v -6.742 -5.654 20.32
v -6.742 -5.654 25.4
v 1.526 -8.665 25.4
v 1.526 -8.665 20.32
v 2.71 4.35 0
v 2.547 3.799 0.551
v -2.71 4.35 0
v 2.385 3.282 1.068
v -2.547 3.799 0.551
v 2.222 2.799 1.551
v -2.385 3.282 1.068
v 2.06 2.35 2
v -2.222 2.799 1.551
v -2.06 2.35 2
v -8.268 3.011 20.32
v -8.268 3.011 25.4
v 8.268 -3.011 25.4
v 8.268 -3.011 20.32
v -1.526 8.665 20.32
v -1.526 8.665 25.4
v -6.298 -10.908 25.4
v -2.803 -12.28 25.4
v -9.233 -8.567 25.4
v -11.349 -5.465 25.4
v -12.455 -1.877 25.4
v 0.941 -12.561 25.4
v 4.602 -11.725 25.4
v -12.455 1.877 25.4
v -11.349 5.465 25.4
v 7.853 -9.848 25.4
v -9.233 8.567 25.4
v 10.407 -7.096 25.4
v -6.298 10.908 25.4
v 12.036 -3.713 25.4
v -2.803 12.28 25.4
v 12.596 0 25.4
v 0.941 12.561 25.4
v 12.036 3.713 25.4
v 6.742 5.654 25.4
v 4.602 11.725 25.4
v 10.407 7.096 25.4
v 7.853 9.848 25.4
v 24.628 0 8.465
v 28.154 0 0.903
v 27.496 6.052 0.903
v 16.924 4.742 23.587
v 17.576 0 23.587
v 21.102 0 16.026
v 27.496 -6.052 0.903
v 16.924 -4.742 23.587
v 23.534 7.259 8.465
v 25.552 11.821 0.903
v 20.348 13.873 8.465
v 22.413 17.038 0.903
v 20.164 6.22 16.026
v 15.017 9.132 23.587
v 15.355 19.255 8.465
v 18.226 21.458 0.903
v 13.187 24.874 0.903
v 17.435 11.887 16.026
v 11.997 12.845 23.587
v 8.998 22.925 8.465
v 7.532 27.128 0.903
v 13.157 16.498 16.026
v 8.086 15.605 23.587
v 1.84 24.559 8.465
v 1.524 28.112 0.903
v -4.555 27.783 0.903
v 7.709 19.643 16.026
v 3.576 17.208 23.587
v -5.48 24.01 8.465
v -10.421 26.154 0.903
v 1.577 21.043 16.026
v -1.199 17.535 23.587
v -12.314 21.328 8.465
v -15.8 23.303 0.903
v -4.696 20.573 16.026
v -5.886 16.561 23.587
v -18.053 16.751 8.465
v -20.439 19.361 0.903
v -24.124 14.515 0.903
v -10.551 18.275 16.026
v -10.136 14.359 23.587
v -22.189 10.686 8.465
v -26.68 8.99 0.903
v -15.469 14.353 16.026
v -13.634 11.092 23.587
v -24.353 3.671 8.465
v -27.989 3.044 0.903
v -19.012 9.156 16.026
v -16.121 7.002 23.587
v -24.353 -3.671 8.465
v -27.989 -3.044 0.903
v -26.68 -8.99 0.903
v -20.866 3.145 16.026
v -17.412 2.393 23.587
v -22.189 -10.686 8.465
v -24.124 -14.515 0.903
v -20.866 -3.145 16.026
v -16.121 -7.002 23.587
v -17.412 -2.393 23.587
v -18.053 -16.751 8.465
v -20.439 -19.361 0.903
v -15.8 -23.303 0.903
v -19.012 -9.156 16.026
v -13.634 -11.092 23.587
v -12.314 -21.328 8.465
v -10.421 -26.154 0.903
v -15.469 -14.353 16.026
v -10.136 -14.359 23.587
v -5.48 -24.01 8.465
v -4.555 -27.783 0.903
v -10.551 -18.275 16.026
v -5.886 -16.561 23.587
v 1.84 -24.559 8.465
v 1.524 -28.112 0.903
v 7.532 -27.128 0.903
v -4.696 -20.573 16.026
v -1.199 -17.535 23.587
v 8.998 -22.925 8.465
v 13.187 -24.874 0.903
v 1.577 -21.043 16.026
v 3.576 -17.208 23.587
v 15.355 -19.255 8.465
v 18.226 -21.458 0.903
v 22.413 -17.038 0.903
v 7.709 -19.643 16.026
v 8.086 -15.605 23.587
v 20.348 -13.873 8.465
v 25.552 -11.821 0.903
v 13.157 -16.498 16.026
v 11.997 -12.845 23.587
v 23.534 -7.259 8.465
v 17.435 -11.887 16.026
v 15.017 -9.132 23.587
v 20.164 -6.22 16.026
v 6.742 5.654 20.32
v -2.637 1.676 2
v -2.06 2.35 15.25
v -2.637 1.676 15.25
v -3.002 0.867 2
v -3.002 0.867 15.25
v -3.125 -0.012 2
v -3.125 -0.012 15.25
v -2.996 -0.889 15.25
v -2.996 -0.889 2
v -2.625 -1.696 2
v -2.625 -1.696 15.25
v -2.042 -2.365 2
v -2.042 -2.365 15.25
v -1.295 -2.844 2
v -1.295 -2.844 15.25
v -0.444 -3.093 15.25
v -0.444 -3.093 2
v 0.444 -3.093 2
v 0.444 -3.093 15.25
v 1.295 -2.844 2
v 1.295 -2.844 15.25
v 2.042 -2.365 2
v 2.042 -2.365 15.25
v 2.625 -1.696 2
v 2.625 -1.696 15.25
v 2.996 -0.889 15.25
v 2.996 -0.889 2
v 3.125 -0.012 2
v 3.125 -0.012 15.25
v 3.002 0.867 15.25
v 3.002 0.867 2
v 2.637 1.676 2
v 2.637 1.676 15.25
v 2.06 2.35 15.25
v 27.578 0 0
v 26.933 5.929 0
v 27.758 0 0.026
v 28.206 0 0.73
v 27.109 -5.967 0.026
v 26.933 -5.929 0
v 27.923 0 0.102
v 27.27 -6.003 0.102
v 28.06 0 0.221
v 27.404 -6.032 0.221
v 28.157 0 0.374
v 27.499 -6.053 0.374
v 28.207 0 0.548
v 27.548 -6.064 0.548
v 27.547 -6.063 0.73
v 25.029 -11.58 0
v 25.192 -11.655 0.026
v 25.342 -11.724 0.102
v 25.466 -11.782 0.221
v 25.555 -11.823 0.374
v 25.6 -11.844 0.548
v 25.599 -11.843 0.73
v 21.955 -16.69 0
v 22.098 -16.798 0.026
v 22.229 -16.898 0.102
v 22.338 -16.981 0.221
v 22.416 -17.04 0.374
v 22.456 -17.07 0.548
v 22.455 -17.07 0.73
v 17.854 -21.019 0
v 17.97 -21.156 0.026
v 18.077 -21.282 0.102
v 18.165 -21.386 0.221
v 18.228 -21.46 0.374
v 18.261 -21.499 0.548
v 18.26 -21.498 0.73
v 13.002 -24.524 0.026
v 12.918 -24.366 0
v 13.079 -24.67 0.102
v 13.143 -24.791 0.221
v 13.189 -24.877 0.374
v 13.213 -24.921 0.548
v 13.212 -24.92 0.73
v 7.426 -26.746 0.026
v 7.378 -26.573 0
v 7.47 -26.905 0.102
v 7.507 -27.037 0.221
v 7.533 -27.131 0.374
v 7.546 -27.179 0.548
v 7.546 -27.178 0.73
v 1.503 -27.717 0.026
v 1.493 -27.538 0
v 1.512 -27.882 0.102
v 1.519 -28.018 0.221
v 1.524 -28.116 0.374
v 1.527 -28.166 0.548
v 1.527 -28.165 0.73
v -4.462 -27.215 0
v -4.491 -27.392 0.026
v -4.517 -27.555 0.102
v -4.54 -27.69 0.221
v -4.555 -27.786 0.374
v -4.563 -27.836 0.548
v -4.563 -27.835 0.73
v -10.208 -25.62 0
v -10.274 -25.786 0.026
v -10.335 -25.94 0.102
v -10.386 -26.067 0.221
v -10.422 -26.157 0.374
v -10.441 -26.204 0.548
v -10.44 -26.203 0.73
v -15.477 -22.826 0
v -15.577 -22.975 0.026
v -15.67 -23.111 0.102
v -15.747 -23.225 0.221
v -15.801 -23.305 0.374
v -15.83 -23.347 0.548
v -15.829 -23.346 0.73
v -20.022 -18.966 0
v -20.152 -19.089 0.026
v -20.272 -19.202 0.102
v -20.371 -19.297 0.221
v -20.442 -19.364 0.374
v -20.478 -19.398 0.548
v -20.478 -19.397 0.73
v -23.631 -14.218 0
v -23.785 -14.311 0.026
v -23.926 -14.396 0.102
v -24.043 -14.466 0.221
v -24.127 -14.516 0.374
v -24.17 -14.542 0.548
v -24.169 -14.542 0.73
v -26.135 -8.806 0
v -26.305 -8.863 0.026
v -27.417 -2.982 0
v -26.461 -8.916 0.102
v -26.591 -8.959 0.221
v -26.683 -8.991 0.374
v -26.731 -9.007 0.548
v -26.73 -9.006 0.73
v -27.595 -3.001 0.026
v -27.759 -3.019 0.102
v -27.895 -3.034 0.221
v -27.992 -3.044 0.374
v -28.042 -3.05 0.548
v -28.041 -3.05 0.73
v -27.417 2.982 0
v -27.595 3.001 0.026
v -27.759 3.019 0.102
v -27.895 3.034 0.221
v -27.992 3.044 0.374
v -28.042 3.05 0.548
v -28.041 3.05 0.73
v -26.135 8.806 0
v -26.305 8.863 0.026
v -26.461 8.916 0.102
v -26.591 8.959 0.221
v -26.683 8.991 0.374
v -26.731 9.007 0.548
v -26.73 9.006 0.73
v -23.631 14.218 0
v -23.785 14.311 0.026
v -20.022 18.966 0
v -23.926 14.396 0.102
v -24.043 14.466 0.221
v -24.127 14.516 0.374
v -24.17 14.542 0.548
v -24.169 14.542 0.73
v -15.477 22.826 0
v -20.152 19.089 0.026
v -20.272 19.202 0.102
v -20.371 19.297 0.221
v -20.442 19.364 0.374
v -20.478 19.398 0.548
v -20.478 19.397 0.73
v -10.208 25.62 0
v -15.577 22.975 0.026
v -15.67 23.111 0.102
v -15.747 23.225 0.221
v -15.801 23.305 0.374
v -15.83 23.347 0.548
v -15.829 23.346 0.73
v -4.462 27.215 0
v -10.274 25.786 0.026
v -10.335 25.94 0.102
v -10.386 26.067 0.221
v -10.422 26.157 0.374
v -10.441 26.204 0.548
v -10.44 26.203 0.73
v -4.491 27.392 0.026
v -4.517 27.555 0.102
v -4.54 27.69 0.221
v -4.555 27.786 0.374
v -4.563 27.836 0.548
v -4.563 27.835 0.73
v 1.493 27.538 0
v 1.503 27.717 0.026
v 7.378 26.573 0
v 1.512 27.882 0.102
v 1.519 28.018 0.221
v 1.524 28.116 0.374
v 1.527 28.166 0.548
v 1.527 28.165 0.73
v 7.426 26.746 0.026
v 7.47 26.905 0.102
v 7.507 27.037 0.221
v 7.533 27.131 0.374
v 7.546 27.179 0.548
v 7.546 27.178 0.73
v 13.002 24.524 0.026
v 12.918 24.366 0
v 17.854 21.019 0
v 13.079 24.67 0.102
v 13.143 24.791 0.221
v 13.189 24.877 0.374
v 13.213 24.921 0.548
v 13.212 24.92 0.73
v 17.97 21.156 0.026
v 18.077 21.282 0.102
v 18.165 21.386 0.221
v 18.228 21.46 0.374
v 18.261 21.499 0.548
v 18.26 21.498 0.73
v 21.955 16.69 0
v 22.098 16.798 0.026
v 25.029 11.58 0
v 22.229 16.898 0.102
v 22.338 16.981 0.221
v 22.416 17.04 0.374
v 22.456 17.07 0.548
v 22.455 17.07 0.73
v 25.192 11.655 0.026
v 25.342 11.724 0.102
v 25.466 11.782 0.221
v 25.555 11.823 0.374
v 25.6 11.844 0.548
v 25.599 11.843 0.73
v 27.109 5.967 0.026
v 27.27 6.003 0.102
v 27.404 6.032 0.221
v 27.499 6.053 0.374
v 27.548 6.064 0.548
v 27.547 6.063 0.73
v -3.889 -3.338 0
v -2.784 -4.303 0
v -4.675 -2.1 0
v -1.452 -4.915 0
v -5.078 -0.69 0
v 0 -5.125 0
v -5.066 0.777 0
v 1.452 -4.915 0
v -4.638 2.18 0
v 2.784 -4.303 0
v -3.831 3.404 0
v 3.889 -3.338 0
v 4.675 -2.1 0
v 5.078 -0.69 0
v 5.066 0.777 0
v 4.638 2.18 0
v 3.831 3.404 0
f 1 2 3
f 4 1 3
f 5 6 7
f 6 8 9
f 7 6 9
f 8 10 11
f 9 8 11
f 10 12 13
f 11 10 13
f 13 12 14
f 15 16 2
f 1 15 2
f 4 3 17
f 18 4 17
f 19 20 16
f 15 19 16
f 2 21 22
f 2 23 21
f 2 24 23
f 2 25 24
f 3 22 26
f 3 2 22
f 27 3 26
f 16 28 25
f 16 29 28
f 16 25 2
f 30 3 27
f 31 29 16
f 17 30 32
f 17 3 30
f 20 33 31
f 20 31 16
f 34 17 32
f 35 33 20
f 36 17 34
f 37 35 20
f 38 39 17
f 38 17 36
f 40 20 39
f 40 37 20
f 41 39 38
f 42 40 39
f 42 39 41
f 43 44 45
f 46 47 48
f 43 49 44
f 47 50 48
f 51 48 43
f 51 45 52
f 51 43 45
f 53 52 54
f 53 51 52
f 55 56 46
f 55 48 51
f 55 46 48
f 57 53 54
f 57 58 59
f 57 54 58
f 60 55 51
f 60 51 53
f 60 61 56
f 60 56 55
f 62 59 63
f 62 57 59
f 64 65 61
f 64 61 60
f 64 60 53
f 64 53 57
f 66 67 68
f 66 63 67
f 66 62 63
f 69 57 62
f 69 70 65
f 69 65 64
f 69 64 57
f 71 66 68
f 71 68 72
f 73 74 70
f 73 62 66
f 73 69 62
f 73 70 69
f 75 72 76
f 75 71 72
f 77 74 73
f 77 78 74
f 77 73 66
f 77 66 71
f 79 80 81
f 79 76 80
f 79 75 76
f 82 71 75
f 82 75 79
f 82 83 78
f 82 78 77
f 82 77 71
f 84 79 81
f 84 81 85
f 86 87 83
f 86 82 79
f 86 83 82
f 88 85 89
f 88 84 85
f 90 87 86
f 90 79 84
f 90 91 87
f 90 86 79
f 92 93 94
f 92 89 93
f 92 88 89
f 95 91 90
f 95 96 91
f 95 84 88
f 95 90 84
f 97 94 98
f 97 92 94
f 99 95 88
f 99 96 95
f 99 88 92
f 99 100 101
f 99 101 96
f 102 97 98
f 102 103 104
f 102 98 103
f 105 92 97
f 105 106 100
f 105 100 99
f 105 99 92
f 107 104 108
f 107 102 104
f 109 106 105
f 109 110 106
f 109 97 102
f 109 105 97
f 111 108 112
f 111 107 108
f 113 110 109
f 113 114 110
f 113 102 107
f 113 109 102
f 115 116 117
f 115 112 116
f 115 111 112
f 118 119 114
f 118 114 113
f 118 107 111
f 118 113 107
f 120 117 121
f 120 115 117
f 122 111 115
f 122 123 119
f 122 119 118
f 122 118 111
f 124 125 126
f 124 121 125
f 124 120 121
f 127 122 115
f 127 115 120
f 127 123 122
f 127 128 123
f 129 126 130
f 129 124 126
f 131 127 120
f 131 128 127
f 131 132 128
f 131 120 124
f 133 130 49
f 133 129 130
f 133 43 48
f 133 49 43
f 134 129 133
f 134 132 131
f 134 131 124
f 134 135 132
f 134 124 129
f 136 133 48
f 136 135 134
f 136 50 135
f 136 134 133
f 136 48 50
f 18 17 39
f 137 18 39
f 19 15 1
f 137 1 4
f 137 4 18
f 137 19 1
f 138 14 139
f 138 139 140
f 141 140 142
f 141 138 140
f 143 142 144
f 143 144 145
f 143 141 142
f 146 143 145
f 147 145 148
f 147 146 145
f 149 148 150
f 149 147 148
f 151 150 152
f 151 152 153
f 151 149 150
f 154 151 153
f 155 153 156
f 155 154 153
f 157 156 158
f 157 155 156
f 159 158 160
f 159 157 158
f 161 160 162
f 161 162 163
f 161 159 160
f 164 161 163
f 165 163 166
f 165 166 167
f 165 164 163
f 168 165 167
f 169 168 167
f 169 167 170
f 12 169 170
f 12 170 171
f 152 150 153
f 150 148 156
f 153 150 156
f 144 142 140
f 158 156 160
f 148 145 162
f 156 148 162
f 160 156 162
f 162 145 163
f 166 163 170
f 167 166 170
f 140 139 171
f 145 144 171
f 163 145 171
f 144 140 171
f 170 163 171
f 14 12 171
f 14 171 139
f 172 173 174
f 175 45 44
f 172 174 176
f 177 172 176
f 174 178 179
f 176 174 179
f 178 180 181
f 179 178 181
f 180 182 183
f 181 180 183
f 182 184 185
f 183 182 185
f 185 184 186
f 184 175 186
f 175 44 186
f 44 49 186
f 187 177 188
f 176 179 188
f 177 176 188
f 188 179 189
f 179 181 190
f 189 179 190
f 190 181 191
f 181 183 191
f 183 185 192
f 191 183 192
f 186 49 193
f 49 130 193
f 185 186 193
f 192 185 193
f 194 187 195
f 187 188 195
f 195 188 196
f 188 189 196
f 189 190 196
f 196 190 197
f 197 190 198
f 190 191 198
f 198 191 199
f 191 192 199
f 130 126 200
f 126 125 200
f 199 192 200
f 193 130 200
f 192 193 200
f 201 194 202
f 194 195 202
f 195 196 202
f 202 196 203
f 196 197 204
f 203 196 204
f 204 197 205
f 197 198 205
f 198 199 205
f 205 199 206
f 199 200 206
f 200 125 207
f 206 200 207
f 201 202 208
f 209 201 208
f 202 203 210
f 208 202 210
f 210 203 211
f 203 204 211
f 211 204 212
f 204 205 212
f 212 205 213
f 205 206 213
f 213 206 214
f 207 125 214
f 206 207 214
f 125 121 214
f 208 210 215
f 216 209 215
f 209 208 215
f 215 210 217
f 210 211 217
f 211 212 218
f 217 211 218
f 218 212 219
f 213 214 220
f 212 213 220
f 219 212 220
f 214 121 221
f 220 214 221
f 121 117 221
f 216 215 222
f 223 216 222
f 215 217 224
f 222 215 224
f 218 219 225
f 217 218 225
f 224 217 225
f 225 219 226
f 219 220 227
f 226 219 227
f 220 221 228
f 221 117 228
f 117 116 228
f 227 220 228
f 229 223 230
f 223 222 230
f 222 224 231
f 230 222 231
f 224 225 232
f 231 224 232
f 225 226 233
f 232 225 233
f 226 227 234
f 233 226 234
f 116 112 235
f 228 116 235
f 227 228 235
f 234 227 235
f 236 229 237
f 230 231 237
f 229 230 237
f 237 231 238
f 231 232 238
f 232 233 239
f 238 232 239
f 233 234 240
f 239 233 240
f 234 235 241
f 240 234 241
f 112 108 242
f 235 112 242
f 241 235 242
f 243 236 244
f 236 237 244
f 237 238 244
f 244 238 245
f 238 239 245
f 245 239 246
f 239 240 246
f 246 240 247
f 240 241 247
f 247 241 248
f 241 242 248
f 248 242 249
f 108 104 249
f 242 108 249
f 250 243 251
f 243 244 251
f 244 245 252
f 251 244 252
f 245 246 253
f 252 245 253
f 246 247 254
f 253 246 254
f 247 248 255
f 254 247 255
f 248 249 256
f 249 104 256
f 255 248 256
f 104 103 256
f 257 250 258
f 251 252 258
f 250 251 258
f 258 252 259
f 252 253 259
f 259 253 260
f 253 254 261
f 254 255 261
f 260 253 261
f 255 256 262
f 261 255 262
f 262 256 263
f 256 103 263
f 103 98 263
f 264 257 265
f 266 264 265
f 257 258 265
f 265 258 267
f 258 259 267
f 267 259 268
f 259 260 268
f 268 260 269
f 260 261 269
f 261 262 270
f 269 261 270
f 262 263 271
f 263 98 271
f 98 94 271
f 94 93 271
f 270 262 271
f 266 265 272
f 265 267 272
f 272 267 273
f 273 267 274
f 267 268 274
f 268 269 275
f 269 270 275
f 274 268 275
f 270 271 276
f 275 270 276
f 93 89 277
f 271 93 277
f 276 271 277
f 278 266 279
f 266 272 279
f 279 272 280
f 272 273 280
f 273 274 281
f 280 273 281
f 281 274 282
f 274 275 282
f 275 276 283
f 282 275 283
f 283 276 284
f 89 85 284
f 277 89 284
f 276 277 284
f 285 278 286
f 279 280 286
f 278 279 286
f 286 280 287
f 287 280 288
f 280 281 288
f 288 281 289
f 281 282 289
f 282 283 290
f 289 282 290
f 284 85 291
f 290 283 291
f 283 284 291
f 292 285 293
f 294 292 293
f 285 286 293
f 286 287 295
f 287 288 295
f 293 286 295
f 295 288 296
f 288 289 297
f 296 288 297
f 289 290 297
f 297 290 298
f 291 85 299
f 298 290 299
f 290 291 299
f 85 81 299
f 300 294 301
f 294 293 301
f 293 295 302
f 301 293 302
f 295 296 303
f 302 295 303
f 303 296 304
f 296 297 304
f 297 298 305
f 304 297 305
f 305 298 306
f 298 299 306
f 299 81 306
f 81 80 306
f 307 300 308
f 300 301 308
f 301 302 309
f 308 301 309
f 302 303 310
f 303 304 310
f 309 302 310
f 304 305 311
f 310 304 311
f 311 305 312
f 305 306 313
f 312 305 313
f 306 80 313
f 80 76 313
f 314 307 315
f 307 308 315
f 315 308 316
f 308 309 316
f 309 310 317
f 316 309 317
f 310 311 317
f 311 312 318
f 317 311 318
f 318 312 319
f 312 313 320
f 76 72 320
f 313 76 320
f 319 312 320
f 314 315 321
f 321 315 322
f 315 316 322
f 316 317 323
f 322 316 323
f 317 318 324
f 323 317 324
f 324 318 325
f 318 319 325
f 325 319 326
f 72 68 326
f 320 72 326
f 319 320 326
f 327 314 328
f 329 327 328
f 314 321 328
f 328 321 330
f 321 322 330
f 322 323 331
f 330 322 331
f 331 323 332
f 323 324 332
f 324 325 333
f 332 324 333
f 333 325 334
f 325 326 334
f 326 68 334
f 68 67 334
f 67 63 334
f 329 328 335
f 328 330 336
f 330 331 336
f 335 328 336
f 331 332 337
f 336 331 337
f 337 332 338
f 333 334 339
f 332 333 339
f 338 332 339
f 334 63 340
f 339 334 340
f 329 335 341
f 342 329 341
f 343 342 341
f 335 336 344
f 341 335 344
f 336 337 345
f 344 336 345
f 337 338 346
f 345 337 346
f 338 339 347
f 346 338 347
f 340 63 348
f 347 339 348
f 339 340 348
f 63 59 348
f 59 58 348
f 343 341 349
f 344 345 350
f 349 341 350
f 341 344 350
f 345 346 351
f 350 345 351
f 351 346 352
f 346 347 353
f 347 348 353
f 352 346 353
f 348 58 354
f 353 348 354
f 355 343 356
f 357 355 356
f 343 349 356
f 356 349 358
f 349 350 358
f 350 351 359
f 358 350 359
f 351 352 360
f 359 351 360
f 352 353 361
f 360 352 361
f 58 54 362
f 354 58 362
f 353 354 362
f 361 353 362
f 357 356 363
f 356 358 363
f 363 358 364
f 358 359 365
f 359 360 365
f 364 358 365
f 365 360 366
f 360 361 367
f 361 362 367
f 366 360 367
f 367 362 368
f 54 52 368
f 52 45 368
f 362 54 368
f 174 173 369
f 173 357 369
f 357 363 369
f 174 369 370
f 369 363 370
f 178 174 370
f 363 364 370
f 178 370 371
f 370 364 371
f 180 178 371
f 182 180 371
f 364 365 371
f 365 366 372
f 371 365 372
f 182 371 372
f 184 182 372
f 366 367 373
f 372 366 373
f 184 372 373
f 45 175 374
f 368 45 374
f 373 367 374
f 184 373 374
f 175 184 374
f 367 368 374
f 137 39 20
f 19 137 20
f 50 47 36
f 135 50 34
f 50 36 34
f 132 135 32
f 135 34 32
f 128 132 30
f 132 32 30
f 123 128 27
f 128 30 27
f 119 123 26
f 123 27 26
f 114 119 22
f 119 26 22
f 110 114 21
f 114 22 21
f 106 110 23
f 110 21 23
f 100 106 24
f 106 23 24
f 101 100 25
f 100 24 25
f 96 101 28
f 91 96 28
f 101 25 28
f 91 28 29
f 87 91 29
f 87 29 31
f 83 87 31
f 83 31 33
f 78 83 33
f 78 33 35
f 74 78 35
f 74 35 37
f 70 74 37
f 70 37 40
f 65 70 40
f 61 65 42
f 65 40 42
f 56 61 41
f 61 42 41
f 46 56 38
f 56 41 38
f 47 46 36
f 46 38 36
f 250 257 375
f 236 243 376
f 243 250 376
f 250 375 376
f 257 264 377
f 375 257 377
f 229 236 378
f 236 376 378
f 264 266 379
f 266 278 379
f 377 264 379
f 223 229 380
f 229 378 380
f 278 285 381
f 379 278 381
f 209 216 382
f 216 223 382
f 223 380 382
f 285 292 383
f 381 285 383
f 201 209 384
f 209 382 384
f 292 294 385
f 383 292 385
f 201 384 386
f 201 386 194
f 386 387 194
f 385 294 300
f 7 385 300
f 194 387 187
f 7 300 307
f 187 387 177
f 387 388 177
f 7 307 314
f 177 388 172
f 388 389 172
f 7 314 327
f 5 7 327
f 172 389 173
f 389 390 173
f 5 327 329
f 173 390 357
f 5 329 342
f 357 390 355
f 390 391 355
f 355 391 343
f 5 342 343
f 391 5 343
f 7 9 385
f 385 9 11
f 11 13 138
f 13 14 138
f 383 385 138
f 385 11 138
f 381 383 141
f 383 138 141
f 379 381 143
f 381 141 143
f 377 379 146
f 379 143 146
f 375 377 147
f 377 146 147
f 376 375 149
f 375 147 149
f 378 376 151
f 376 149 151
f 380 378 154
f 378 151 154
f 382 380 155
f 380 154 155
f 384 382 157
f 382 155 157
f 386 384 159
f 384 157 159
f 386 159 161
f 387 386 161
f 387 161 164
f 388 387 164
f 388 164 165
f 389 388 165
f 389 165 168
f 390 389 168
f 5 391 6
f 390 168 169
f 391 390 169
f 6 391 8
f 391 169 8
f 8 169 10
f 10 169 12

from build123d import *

# Parameters (mm, degrees)
SKETCH1_R            = 28.575
CONE_EXTRUDE_DEPTH   = 25.4
CONE_EXTRUDE_TAPER   = 25
MOTOR_AXLE_CUT_DEPTH = 15.25
CHAMFER1_SIZE        = 2
CHAMFER1_SIZE_2      = 4.134883836
CHAMFER2_SIZE        = 2
BOLT_HOLE_CUT_DEPTH  = 5.08
FILLET1_R            = 0.635


with BuildPart() as part:
    # Sketch1 → Cone Extrude (new body)
    with BuildSketch(Plane.XY):
        Circle(SKETCH1_R)
    extrude(amount=CONE_EXTRUDE_DEPTH, taper=CONE_EXTRUDE_TAPER)

    # Sketch2 → Motor Axle Cut (cut)
    with BuildSketch(Plane(origin=(0, 0, 0), x_dir=(-1, 0, 0), z_dir=(0, 0, -1))):
        with BuildLine():
            Line((-2.059884706, 2.35), (2.059884706, 2.35))
            ThreePointArc((2.059884706, 2.35), (0, -3.125), (-2.059884706, 2.35))
        make_face()
    extrude(amount=-MOTOR_AXLE_CUT_DEPTH, mode=Mode.SUBTRACT)

    # Chamfer1
    # the kernel refuses this chamfer: 4.134883836, 2 mm, written as the material it takes off along each edge
    with BuildSketch(Plane(origin=(0, 0, 25.4), x_dir=(1, 0, 0), z_dir=(0, 1, 0))) as chamfer1_piece_1:
        Polygon((16.730785483 + CHAMFER1_SIZE * 0.422618261741, CHAMFER1_SIZE * 0.906307787037), (16.730785483 - CHAMFER1_SIZE_2, 0), (16.730785483, 0), align=None)
    revolve(axis=Axis((0, 0, 25.4), (0, 0, -1)), mode=Mode.SUBTRACT)

    # Chamfer2
    chamfer2_edges = [part.edges().sort_by_distance(p)[0] for p in [
        (0, -3.125, 0),
        (0, 2.35, 0),
    ]]
    chamfer(chamfer2_edges, length=CHAMFER2_SIZE)

    # Sketch3 → Bolt Hole Cut (cut)
    with BuildSketch(Plane.XY.offset(25.4)):
        Polygon((6.741570116, 5.654240212), (-1.525930605, 8.665491088), (-8.267500721, 3.011250876), (-6.741570116, -5.654240212), (1.525930605, -8.665491088), (8.267500721, -3.011250876), align=None)
    extrude(amount=-BOLT_HOLE_CUT_DEPTH, mode=Mode.SUBTRACT)

    # Fillet1
    fillet1_edges = [part.edges().sort_by_distance(p)[0] for p in [
        (-28.575, 0, 0),
    ]]
    fillet(fillet1_edges, radius=FILLET1_R)


solid = part.part
